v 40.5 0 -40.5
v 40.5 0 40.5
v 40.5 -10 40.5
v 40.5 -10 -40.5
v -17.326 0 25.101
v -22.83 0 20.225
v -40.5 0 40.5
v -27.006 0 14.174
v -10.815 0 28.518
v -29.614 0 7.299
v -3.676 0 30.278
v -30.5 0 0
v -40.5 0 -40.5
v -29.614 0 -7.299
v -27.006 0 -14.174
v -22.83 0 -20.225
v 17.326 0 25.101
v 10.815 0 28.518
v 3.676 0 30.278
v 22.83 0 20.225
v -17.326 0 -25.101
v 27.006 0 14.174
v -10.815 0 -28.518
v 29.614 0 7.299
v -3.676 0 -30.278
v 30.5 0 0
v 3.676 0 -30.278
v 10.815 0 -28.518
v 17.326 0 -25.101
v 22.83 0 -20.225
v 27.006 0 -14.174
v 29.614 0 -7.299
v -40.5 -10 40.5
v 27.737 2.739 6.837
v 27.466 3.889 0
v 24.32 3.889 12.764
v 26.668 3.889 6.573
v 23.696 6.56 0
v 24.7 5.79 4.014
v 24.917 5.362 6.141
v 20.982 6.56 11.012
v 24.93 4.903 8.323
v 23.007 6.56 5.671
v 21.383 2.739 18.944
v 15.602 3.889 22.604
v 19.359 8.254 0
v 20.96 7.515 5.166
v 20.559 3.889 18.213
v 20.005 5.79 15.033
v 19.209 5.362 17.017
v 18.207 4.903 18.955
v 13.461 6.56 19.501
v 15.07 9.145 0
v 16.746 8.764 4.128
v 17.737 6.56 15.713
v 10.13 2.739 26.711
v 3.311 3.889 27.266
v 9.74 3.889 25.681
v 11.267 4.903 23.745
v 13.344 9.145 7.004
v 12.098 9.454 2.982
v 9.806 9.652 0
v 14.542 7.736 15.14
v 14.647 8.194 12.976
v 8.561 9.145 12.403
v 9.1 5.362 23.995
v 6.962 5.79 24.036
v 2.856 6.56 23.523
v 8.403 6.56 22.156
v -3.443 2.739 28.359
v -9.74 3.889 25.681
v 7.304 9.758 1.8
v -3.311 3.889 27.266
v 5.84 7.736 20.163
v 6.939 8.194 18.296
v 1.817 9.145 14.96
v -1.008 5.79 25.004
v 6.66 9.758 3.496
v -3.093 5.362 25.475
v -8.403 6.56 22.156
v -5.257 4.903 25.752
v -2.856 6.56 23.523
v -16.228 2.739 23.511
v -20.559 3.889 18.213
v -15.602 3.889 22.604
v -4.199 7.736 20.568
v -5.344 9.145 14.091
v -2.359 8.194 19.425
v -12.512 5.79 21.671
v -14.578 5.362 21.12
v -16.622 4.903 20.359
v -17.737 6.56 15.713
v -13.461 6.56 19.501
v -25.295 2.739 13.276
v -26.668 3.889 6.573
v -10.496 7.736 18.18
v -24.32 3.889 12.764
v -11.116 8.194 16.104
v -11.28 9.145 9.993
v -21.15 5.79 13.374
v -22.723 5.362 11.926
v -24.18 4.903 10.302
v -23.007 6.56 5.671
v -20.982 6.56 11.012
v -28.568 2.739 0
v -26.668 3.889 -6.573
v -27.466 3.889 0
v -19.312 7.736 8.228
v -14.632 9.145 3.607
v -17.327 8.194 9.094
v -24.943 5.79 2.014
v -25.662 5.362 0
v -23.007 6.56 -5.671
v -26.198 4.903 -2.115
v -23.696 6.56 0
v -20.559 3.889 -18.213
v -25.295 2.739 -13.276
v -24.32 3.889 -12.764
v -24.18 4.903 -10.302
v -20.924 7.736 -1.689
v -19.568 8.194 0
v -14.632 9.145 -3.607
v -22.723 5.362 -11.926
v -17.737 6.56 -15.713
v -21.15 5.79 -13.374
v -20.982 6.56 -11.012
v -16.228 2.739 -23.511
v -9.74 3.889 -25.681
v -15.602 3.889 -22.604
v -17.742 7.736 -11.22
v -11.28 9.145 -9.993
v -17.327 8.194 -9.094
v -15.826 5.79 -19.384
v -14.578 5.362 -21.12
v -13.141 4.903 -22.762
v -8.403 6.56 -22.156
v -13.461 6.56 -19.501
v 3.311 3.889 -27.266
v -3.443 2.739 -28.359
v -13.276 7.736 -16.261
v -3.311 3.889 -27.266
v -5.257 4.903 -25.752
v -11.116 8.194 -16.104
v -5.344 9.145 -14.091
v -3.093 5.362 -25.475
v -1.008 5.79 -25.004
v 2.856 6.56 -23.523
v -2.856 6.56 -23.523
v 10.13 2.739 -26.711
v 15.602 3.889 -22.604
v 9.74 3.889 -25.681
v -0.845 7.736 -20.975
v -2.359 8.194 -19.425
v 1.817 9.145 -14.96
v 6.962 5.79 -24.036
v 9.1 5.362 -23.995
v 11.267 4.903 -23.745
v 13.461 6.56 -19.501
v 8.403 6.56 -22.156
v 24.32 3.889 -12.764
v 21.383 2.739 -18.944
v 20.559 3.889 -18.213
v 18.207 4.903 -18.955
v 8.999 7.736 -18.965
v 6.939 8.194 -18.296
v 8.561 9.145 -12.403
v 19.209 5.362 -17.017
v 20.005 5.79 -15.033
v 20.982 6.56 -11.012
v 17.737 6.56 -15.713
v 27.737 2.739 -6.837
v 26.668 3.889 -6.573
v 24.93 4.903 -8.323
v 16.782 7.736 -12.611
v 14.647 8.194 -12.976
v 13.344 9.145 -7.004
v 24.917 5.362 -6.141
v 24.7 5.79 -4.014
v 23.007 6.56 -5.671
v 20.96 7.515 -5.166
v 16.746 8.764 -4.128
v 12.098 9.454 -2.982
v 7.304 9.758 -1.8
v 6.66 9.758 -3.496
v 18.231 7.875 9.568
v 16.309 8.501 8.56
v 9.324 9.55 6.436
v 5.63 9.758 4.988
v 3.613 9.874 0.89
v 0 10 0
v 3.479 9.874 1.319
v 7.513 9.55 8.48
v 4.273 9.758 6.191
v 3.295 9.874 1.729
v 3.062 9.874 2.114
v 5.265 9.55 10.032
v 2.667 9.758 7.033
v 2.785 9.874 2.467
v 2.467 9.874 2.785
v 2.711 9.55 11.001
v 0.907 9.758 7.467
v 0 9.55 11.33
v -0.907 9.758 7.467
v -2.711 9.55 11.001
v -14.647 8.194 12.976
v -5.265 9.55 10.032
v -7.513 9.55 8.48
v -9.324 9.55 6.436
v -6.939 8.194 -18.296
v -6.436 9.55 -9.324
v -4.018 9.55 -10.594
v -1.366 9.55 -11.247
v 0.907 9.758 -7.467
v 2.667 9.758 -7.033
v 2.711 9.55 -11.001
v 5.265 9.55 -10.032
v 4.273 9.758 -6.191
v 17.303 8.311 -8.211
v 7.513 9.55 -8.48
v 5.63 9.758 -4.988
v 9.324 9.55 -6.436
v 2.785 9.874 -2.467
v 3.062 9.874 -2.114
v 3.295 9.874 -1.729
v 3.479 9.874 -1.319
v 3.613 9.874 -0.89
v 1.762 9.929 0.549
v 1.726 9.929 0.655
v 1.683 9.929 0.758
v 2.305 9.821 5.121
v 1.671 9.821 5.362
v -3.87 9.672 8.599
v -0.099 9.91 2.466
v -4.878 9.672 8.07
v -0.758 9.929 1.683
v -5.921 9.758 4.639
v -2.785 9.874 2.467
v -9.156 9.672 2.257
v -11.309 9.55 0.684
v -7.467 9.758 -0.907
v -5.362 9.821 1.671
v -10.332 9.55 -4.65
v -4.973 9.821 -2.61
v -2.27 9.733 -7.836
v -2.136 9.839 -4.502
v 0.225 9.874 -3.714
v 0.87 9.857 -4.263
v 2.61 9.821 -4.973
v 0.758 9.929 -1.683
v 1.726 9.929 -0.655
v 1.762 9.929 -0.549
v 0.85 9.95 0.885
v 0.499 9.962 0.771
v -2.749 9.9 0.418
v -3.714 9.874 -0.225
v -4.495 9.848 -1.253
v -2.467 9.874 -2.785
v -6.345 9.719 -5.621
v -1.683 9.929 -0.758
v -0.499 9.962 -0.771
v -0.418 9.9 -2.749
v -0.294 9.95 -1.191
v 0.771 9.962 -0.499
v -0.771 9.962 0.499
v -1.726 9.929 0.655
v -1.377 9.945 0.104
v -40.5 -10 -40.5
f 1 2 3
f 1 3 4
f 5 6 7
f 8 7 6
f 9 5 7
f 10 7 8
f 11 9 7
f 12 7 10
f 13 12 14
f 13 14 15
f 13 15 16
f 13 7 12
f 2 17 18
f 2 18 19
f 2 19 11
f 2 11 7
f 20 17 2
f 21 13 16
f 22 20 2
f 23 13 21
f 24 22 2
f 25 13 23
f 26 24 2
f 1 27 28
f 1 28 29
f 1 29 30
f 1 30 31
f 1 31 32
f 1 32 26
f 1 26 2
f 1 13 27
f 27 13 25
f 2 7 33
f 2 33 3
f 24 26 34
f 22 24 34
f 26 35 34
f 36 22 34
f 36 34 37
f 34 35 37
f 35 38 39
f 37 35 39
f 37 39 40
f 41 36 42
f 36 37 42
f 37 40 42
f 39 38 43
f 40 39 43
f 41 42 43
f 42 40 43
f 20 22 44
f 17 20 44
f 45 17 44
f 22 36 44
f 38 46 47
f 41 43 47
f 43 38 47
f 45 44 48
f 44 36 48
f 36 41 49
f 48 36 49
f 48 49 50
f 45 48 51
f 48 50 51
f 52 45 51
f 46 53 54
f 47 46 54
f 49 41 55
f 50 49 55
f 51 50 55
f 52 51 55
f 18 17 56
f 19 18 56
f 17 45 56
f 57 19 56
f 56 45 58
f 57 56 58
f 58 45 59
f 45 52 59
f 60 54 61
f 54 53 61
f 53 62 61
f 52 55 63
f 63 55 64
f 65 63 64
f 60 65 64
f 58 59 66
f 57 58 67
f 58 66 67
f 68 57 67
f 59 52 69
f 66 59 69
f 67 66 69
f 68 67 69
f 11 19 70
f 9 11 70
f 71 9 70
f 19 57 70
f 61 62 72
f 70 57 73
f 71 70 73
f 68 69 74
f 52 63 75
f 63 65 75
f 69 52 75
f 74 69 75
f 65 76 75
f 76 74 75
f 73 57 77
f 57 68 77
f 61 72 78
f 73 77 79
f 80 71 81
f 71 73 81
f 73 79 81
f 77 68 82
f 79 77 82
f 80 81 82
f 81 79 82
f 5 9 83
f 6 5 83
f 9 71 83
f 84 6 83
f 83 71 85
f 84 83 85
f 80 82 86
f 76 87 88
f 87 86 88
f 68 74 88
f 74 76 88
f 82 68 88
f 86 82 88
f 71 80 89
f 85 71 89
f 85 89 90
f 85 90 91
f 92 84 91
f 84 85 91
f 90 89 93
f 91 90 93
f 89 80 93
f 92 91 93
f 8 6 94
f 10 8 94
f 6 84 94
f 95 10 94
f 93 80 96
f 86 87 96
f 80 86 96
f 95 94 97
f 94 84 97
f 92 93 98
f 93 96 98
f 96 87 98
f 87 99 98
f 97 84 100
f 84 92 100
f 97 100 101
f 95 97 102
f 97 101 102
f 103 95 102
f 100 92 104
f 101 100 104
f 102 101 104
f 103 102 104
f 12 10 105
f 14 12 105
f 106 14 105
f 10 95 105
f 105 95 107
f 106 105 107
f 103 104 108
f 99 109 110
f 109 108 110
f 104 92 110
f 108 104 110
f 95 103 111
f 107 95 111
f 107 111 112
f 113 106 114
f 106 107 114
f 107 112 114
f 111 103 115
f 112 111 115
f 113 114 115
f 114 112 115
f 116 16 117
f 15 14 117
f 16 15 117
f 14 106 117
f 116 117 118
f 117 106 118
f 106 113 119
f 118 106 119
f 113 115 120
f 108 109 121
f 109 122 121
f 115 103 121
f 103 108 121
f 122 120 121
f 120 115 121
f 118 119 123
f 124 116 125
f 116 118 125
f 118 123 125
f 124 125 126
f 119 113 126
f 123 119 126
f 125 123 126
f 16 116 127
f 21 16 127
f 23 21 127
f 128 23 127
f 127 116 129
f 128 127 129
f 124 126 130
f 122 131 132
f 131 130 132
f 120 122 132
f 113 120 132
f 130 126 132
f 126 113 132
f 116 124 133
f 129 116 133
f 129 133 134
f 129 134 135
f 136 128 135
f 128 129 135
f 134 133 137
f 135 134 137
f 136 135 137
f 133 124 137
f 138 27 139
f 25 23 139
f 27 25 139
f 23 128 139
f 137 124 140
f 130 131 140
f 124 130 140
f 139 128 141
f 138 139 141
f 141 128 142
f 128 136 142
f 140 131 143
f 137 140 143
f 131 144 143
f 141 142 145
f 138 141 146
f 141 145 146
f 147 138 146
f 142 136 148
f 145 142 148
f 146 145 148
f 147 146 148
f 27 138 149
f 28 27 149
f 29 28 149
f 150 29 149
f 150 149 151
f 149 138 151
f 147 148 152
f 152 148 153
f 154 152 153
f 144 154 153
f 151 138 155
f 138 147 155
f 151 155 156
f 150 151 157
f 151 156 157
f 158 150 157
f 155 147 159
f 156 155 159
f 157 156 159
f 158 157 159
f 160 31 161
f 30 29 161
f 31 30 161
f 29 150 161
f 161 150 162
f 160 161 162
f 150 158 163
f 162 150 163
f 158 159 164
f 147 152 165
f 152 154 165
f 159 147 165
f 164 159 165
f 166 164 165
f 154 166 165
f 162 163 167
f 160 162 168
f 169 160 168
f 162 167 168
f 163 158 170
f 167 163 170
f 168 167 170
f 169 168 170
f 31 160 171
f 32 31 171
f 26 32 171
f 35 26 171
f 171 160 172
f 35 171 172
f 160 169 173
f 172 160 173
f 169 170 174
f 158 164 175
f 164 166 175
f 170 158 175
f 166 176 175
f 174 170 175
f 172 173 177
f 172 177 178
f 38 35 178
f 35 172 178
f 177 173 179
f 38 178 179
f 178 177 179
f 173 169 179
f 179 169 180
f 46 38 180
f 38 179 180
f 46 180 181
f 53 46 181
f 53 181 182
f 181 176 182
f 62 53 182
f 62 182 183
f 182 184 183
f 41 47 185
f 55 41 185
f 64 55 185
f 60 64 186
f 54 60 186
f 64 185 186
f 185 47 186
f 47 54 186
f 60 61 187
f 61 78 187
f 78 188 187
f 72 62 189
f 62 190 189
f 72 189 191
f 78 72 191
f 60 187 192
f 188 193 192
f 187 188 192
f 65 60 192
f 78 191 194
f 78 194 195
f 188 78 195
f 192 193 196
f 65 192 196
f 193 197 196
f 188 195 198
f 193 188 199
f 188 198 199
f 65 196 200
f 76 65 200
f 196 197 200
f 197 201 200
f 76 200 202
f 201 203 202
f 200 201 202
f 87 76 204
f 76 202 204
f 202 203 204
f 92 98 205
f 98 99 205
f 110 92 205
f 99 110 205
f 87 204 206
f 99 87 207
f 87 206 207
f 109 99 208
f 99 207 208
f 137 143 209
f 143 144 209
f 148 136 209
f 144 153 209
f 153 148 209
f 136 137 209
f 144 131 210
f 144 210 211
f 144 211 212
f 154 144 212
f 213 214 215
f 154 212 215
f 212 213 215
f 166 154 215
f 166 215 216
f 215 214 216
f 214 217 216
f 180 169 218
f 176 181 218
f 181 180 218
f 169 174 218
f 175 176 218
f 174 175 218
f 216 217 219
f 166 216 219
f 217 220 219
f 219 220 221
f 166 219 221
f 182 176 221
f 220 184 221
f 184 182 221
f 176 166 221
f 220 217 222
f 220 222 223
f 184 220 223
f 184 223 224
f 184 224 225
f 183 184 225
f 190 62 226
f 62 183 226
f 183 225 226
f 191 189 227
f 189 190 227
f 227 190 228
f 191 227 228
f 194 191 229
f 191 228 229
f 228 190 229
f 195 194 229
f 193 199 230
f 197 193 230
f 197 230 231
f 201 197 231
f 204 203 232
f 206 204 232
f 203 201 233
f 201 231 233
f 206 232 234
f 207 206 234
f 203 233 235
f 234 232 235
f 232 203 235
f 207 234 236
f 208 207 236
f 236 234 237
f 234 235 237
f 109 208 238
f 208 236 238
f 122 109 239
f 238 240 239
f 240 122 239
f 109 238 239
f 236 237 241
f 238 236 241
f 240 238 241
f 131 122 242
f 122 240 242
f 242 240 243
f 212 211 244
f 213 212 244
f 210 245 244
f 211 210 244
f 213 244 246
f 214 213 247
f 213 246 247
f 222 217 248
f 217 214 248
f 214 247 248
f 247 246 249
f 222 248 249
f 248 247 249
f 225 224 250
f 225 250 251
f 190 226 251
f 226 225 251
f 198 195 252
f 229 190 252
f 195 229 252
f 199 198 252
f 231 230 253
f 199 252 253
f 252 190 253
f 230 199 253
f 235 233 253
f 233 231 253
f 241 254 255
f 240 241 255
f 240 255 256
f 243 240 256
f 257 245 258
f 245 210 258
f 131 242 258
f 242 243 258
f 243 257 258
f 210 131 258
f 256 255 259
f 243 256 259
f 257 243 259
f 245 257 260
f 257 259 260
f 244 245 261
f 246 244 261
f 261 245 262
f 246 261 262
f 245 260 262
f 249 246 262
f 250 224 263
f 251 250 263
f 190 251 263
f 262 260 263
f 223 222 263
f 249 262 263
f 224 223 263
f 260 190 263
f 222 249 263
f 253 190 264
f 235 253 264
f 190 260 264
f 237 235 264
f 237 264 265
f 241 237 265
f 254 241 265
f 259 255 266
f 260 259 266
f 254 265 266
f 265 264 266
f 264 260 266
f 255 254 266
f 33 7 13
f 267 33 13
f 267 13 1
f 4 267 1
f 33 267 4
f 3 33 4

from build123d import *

# Parameters (mm, degrees)
SKETCH2_W           = 81
SKETCH2_H           = 81
BOSS_EXTRUDE1_DEPTH = 10


with BuildPart() as part:
    # Sketch1 → Revolve1 (revolve)
    with BuildSketch(Plane.XY):
        with BuildLine():
            Line((0, 10), (0, 0))
            Line((0, 0), (30.5, 0))
            add(Edge.make_bspline(
                [(30.5, 0), (24.462439427, 10.588096747), (11.157200838, 9.492825223), (0, 10)],
                knots=[0, 0, 0, 0, 1, 1, 1, 1], degree=3))
        make_face()
    revolve(axis=Axis((0, 10, 0), (0, -1, 0)))

    # Sketch2 → Boss-Extrude1 (add)
    with BuildSketch(Plane(origin=(0, 0, 0), x_dir=(1, 0, 0), z_dir=(0, 1, 0))):
        Rectangle(SKETCH2_W, SKETCH2_H)
    extrude(amount=-BOSS_EXTRUDE1_DEPTH)


solid = part.part
